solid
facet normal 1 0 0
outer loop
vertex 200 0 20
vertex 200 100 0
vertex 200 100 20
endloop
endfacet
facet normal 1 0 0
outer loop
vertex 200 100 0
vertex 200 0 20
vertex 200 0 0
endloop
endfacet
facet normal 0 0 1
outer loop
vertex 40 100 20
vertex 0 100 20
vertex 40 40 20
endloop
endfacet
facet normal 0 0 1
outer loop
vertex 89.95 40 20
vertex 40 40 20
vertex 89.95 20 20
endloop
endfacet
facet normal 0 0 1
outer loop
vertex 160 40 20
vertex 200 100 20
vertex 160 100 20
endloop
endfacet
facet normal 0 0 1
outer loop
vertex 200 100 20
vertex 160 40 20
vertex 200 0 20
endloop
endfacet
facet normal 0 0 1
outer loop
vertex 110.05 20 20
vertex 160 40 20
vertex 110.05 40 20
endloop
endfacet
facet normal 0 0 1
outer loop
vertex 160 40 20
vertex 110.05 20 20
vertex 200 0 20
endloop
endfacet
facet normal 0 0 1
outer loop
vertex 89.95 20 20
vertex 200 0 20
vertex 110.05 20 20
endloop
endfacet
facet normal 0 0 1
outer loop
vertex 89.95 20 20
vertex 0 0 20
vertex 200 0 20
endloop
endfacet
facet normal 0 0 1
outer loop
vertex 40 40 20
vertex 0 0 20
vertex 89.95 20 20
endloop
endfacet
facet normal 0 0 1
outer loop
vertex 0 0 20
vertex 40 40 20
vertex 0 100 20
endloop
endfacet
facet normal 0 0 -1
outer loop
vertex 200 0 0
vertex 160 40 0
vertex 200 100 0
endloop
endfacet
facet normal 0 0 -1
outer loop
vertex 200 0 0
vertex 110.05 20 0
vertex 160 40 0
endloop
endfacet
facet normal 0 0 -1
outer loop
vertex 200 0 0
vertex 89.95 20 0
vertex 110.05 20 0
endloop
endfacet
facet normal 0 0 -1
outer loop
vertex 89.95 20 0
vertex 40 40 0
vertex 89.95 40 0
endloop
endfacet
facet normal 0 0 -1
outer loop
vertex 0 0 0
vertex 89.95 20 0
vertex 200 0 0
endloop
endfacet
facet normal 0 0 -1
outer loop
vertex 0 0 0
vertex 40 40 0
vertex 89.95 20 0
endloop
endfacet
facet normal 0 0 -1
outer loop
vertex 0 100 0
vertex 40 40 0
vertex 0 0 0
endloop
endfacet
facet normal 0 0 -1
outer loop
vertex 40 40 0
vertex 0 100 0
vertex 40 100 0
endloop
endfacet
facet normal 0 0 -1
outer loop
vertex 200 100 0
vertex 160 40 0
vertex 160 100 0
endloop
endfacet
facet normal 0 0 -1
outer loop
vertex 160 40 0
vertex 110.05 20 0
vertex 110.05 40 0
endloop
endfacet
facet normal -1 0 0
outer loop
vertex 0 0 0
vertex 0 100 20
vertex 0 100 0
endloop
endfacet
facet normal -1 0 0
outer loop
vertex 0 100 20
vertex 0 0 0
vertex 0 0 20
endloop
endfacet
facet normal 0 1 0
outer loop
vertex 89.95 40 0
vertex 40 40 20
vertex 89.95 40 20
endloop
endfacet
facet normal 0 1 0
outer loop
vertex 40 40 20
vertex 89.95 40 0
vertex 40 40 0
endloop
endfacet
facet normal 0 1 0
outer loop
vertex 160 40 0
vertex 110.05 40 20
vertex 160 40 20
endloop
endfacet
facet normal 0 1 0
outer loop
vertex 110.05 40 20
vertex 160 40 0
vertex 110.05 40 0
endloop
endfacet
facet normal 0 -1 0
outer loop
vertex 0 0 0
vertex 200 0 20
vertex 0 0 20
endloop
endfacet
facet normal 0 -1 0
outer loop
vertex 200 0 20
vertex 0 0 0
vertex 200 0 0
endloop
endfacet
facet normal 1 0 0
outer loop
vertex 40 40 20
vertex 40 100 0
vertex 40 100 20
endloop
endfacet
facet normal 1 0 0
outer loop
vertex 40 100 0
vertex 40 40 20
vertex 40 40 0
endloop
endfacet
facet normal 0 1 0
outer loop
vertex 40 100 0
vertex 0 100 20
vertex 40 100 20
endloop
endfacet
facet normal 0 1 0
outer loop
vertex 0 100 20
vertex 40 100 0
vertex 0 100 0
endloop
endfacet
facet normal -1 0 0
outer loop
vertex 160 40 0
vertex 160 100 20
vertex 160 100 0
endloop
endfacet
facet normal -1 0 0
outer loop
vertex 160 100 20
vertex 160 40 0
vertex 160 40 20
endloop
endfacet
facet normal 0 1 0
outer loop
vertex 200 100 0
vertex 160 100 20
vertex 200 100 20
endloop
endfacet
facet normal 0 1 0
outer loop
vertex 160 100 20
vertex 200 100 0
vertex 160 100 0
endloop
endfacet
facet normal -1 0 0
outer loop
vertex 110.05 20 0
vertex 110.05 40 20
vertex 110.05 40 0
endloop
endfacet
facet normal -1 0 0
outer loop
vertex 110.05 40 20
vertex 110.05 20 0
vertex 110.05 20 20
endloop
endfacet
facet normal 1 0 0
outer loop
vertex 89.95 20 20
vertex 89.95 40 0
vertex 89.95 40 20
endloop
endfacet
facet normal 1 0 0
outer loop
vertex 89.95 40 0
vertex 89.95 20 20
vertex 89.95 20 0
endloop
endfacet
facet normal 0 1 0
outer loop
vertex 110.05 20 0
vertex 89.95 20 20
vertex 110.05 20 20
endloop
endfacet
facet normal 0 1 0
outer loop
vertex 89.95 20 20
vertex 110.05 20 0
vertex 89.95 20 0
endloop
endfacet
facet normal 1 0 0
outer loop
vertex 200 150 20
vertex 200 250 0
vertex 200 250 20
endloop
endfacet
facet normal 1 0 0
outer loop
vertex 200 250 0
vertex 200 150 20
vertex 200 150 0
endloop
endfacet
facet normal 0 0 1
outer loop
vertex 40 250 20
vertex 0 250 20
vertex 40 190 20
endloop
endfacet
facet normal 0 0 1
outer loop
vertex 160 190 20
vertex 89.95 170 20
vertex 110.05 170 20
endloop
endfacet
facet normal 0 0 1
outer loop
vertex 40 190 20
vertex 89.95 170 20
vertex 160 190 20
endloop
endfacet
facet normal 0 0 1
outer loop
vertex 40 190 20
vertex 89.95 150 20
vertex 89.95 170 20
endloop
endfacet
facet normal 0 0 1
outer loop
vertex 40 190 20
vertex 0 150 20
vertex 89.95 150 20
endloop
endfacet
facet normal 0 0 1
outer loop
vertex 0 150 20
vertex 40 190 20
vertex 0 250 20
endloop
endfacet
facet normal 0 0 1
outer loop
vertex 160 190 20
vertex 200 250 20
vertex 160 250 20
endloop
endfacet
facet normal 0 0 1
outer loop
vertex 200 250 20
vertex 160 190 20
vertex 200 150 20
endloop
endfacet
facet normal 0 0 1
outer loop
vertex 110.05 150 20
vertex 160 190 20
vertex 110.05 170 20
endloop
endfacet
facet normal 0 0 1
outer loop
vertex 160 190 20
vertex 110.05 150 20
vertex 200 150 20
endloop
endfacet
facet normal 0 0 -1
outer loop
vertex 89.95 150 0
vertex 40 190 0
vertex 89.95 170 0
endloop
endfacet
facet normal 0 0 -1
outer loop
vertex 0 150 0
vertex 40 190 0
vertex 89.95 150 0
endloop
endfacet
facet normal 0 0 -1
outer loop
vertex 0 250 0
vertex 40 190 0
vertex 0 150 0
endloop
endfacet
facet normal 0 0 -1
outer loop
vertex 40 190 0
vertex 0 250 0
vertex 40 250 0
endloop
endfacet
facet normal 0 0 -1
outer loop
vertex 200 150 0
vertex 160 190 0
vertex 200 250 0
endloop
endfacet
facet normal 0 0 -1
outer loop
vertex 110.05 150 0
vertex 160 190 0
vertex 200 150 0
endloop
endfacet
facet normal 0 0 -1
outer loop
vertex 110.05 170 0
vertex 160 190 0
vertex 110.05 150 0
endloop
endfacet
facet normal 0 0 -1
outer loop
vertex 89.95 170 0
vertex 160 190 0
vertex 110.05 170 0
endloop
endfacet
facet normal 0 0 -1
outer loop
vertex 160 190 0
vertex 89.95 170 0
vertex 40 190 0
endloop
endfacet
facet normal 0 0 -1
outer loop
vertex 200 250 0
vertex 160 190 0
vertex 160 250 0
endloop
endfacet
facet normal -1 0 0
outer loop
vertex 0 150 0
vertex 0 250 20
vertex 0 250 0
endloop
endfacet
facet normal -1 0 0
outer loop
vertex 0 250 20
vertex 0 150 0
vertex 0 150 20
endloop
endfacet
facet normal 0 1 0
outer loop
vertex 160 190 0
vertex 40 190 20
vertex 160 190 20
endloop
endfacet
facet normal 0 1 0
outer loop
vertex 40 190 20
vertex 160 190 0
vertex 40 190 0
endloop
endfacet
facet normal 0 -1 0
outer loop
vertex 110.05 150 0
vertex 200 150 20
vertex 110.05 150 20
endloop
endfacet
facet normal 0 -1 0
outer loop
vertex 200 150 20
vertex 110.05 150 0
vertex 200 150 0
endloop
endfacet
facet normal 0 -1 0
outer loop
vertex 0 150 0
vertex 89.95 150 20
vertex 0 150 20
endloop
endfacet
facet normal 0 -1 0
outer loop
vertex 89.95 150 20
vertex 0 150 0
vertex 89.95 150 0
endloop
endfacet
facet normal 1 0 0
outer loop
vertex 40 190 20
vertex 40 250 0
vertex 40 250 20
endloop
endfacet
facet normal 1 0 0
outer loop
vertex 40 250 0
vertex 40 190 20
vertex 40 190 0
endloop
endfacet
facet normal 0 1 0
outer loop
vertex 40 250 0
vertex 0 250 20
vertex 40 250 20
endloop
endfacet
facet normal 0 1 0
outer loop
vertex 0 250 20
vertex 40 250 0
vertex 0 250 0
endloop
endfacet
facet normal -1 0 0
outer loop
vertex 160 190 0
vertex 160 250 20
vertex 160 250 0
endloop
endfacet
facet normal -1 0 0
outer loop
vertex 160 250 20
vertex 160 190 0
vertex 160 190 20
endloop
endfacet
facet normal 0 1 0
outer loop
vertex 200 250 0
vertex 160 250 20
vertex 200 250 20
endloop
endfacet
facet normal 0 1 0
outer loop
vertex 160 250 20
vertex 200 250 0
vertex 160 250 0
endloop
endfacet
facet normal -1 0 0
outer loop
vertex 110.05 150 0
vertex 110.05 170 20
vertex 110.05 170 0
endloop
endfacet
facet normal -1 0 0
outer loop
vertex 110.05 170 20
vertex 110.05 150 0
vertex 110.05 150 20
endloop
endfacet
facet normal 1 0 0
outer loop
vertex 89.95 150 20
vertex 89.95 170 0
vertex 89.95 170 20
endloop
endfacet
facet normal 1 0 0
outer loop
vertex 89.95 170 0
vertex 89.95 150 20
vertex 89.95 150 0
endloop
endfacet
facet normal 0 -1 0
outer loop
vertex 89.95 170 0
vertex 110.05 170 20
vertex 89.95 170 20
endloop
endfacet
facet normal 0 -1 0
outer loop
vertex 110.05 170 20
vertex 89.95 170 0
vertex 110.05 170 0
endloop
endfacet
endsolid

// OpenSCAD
// Two-piece slot-together pot stand (trivet).
// Purpose: each half is a U-shaped bracket. The two halves slide together
// through slots cut in the middle of their pot-size bars, locking into a
// flat cross that keeps a pot off the table. The feet rest on the table.
// Notes: pot_diameter is the pot diameter the stand is sized for, at
// most a 25 cm pot, and the bar spans it. The slot reaches half the
// width, so the crossed pot-size bars sit flush at the centerline. The
// file shows both variants side by side: slot on the inner edge of the U
// (facing the opening) and slot on the outer edge. With show_ghosts on,
// fast previews also draw the two halves as a translucent ghost cross in
// the assembled position; full renders and STL exports always output
// solid geometry. Builtin OpenSCAD only, no library needed.

// ================= PARAMETERS =================
/* [Bracket members] */
// Width of every member, in the part's plane
member_width = 40; // [10:1:100]
// Extrusion thickness of the part
member_thickness = 20; // [5:1:50]

/* [Pot size] */
// Pot diameter the stand is sized for, up to a 25 cm pot
pot_diameter = 200; // [100:5:250]
// Length of each of the two feet
foot_length = 100; // [50:5:200]

/* [Center slot] */
// Slide-fit gap added to the mating half's thickness
slot_clearance = 0.1; // [0:0.05:1]

/* [Layout] */
// Empty space between the two parts on the y axis
part_gap = 50; // [0:5:150]

/* [Preview] */
// Draw the assembled ghost cross in fast previews; renders and STL stay solid
show_ghosts = true;

/* [Hidden] */
// Pot-size bar length, spans the pot diameter
bar_length = pot_diameter;
// Slot width across the bar, derived from the member thickness
slot_width = member_thickness + slot_clearance;
// Slot depth, reaches the member centerline, derived from the member width
slot_depth = member_width / 2;

// ================= MAIN MODULE =================
// U-shaped bracket: one pot-size bar spanning the full length plus one
// foot at each end. All members share the same cross-section.
module u_bracket() {
    union() {
        // Pot-size bar, along the x axis
        cube([bar_length, member_width, member_thickness]);

        // Left foot
        cube([member_width, foot_length, member_thickness]);

        // Right foot
        translate([bar_length - member_width, 0, 0])
            cube([member_width, foot_length, member_thickness]);
    }
}

// Bracket with the center slot cut from the pot-size bar. The slot opens
// on the inner edge of the U when inside_slot is true, on the outer edge
// otherwise. The cut box is oversized past both faces so no surfaces stay
// coplanar with the part.
module slotted_bracket(inside_slot) {
    slot_y = inside_slot ? member_width - slot_depth : -0.1;
    difference() {
        u_bracket();
        translate([bar_length / 2 - slot_width / 2, slot_y, -0.5])
            cube([slot_width, slot_depth + 0.1, member_thickness + 1]);
    }
}

// Renders child geometry translucent in fast previews when ghosts are
// on, so the slot cuts stay visible through the material. The % modifier
// keeps ghost geometry out of full renders and STL exports; with ghosts
// off or under --render the child passes through unchanged.
module maybe_ghost() {
    if ($preview && show_ghosts) %children();
    else children();
}

// Ghost view of the two halves in the assembled pose, placed beside the
// printed parts so both stay visible. Each half is stood upright so its
// member width becomes height and its feet become legs, the second half
// is crossed through the first at the slot center, and the final mirror
// turns the crossed pair right-side up with the bars on top. Ghost
// geometry is preview-only: it never reaches renders or STL exports.
module ghost_assembly() {
    // Placement of the crossed half: its member-thickness band is centered
    // on the first half's bar midpoint, and its bar midpoint sits half a
    // slot width behind the layout origin.
    cross_x = bar_length / 2 - slot_width / 2;
    cross_y = -(slot_width + bar_length) / 2;

    mirror([0, 0, 1])
        translate([0, -foot_length, -foot_length]) {
            rotate([90, 0, 0])
                maybe_ghost() slotted_bracket(false);

            translate([cross_x, cross_y, 0])
                rotate([90, 0, 90])
                    maybe_ghost() slotted_bracket(true);
        }
}

// Both parts side by side: first the slot on the inner edge, then the
// slot on the outer edge, separated on the y axis for a clear view. In
// fast previews with ghosts on, the assembled pose is added as a ghost.
module pot_stand() {
    slotted_bracket(true);
    translate([0, foot_length + part_gap, 0])
        slotted_bracket(false);

    if ($preview && show_ghosts)
        ghost_assembly();
}

// ================= INSTANTIATION =================
pot_stand();
